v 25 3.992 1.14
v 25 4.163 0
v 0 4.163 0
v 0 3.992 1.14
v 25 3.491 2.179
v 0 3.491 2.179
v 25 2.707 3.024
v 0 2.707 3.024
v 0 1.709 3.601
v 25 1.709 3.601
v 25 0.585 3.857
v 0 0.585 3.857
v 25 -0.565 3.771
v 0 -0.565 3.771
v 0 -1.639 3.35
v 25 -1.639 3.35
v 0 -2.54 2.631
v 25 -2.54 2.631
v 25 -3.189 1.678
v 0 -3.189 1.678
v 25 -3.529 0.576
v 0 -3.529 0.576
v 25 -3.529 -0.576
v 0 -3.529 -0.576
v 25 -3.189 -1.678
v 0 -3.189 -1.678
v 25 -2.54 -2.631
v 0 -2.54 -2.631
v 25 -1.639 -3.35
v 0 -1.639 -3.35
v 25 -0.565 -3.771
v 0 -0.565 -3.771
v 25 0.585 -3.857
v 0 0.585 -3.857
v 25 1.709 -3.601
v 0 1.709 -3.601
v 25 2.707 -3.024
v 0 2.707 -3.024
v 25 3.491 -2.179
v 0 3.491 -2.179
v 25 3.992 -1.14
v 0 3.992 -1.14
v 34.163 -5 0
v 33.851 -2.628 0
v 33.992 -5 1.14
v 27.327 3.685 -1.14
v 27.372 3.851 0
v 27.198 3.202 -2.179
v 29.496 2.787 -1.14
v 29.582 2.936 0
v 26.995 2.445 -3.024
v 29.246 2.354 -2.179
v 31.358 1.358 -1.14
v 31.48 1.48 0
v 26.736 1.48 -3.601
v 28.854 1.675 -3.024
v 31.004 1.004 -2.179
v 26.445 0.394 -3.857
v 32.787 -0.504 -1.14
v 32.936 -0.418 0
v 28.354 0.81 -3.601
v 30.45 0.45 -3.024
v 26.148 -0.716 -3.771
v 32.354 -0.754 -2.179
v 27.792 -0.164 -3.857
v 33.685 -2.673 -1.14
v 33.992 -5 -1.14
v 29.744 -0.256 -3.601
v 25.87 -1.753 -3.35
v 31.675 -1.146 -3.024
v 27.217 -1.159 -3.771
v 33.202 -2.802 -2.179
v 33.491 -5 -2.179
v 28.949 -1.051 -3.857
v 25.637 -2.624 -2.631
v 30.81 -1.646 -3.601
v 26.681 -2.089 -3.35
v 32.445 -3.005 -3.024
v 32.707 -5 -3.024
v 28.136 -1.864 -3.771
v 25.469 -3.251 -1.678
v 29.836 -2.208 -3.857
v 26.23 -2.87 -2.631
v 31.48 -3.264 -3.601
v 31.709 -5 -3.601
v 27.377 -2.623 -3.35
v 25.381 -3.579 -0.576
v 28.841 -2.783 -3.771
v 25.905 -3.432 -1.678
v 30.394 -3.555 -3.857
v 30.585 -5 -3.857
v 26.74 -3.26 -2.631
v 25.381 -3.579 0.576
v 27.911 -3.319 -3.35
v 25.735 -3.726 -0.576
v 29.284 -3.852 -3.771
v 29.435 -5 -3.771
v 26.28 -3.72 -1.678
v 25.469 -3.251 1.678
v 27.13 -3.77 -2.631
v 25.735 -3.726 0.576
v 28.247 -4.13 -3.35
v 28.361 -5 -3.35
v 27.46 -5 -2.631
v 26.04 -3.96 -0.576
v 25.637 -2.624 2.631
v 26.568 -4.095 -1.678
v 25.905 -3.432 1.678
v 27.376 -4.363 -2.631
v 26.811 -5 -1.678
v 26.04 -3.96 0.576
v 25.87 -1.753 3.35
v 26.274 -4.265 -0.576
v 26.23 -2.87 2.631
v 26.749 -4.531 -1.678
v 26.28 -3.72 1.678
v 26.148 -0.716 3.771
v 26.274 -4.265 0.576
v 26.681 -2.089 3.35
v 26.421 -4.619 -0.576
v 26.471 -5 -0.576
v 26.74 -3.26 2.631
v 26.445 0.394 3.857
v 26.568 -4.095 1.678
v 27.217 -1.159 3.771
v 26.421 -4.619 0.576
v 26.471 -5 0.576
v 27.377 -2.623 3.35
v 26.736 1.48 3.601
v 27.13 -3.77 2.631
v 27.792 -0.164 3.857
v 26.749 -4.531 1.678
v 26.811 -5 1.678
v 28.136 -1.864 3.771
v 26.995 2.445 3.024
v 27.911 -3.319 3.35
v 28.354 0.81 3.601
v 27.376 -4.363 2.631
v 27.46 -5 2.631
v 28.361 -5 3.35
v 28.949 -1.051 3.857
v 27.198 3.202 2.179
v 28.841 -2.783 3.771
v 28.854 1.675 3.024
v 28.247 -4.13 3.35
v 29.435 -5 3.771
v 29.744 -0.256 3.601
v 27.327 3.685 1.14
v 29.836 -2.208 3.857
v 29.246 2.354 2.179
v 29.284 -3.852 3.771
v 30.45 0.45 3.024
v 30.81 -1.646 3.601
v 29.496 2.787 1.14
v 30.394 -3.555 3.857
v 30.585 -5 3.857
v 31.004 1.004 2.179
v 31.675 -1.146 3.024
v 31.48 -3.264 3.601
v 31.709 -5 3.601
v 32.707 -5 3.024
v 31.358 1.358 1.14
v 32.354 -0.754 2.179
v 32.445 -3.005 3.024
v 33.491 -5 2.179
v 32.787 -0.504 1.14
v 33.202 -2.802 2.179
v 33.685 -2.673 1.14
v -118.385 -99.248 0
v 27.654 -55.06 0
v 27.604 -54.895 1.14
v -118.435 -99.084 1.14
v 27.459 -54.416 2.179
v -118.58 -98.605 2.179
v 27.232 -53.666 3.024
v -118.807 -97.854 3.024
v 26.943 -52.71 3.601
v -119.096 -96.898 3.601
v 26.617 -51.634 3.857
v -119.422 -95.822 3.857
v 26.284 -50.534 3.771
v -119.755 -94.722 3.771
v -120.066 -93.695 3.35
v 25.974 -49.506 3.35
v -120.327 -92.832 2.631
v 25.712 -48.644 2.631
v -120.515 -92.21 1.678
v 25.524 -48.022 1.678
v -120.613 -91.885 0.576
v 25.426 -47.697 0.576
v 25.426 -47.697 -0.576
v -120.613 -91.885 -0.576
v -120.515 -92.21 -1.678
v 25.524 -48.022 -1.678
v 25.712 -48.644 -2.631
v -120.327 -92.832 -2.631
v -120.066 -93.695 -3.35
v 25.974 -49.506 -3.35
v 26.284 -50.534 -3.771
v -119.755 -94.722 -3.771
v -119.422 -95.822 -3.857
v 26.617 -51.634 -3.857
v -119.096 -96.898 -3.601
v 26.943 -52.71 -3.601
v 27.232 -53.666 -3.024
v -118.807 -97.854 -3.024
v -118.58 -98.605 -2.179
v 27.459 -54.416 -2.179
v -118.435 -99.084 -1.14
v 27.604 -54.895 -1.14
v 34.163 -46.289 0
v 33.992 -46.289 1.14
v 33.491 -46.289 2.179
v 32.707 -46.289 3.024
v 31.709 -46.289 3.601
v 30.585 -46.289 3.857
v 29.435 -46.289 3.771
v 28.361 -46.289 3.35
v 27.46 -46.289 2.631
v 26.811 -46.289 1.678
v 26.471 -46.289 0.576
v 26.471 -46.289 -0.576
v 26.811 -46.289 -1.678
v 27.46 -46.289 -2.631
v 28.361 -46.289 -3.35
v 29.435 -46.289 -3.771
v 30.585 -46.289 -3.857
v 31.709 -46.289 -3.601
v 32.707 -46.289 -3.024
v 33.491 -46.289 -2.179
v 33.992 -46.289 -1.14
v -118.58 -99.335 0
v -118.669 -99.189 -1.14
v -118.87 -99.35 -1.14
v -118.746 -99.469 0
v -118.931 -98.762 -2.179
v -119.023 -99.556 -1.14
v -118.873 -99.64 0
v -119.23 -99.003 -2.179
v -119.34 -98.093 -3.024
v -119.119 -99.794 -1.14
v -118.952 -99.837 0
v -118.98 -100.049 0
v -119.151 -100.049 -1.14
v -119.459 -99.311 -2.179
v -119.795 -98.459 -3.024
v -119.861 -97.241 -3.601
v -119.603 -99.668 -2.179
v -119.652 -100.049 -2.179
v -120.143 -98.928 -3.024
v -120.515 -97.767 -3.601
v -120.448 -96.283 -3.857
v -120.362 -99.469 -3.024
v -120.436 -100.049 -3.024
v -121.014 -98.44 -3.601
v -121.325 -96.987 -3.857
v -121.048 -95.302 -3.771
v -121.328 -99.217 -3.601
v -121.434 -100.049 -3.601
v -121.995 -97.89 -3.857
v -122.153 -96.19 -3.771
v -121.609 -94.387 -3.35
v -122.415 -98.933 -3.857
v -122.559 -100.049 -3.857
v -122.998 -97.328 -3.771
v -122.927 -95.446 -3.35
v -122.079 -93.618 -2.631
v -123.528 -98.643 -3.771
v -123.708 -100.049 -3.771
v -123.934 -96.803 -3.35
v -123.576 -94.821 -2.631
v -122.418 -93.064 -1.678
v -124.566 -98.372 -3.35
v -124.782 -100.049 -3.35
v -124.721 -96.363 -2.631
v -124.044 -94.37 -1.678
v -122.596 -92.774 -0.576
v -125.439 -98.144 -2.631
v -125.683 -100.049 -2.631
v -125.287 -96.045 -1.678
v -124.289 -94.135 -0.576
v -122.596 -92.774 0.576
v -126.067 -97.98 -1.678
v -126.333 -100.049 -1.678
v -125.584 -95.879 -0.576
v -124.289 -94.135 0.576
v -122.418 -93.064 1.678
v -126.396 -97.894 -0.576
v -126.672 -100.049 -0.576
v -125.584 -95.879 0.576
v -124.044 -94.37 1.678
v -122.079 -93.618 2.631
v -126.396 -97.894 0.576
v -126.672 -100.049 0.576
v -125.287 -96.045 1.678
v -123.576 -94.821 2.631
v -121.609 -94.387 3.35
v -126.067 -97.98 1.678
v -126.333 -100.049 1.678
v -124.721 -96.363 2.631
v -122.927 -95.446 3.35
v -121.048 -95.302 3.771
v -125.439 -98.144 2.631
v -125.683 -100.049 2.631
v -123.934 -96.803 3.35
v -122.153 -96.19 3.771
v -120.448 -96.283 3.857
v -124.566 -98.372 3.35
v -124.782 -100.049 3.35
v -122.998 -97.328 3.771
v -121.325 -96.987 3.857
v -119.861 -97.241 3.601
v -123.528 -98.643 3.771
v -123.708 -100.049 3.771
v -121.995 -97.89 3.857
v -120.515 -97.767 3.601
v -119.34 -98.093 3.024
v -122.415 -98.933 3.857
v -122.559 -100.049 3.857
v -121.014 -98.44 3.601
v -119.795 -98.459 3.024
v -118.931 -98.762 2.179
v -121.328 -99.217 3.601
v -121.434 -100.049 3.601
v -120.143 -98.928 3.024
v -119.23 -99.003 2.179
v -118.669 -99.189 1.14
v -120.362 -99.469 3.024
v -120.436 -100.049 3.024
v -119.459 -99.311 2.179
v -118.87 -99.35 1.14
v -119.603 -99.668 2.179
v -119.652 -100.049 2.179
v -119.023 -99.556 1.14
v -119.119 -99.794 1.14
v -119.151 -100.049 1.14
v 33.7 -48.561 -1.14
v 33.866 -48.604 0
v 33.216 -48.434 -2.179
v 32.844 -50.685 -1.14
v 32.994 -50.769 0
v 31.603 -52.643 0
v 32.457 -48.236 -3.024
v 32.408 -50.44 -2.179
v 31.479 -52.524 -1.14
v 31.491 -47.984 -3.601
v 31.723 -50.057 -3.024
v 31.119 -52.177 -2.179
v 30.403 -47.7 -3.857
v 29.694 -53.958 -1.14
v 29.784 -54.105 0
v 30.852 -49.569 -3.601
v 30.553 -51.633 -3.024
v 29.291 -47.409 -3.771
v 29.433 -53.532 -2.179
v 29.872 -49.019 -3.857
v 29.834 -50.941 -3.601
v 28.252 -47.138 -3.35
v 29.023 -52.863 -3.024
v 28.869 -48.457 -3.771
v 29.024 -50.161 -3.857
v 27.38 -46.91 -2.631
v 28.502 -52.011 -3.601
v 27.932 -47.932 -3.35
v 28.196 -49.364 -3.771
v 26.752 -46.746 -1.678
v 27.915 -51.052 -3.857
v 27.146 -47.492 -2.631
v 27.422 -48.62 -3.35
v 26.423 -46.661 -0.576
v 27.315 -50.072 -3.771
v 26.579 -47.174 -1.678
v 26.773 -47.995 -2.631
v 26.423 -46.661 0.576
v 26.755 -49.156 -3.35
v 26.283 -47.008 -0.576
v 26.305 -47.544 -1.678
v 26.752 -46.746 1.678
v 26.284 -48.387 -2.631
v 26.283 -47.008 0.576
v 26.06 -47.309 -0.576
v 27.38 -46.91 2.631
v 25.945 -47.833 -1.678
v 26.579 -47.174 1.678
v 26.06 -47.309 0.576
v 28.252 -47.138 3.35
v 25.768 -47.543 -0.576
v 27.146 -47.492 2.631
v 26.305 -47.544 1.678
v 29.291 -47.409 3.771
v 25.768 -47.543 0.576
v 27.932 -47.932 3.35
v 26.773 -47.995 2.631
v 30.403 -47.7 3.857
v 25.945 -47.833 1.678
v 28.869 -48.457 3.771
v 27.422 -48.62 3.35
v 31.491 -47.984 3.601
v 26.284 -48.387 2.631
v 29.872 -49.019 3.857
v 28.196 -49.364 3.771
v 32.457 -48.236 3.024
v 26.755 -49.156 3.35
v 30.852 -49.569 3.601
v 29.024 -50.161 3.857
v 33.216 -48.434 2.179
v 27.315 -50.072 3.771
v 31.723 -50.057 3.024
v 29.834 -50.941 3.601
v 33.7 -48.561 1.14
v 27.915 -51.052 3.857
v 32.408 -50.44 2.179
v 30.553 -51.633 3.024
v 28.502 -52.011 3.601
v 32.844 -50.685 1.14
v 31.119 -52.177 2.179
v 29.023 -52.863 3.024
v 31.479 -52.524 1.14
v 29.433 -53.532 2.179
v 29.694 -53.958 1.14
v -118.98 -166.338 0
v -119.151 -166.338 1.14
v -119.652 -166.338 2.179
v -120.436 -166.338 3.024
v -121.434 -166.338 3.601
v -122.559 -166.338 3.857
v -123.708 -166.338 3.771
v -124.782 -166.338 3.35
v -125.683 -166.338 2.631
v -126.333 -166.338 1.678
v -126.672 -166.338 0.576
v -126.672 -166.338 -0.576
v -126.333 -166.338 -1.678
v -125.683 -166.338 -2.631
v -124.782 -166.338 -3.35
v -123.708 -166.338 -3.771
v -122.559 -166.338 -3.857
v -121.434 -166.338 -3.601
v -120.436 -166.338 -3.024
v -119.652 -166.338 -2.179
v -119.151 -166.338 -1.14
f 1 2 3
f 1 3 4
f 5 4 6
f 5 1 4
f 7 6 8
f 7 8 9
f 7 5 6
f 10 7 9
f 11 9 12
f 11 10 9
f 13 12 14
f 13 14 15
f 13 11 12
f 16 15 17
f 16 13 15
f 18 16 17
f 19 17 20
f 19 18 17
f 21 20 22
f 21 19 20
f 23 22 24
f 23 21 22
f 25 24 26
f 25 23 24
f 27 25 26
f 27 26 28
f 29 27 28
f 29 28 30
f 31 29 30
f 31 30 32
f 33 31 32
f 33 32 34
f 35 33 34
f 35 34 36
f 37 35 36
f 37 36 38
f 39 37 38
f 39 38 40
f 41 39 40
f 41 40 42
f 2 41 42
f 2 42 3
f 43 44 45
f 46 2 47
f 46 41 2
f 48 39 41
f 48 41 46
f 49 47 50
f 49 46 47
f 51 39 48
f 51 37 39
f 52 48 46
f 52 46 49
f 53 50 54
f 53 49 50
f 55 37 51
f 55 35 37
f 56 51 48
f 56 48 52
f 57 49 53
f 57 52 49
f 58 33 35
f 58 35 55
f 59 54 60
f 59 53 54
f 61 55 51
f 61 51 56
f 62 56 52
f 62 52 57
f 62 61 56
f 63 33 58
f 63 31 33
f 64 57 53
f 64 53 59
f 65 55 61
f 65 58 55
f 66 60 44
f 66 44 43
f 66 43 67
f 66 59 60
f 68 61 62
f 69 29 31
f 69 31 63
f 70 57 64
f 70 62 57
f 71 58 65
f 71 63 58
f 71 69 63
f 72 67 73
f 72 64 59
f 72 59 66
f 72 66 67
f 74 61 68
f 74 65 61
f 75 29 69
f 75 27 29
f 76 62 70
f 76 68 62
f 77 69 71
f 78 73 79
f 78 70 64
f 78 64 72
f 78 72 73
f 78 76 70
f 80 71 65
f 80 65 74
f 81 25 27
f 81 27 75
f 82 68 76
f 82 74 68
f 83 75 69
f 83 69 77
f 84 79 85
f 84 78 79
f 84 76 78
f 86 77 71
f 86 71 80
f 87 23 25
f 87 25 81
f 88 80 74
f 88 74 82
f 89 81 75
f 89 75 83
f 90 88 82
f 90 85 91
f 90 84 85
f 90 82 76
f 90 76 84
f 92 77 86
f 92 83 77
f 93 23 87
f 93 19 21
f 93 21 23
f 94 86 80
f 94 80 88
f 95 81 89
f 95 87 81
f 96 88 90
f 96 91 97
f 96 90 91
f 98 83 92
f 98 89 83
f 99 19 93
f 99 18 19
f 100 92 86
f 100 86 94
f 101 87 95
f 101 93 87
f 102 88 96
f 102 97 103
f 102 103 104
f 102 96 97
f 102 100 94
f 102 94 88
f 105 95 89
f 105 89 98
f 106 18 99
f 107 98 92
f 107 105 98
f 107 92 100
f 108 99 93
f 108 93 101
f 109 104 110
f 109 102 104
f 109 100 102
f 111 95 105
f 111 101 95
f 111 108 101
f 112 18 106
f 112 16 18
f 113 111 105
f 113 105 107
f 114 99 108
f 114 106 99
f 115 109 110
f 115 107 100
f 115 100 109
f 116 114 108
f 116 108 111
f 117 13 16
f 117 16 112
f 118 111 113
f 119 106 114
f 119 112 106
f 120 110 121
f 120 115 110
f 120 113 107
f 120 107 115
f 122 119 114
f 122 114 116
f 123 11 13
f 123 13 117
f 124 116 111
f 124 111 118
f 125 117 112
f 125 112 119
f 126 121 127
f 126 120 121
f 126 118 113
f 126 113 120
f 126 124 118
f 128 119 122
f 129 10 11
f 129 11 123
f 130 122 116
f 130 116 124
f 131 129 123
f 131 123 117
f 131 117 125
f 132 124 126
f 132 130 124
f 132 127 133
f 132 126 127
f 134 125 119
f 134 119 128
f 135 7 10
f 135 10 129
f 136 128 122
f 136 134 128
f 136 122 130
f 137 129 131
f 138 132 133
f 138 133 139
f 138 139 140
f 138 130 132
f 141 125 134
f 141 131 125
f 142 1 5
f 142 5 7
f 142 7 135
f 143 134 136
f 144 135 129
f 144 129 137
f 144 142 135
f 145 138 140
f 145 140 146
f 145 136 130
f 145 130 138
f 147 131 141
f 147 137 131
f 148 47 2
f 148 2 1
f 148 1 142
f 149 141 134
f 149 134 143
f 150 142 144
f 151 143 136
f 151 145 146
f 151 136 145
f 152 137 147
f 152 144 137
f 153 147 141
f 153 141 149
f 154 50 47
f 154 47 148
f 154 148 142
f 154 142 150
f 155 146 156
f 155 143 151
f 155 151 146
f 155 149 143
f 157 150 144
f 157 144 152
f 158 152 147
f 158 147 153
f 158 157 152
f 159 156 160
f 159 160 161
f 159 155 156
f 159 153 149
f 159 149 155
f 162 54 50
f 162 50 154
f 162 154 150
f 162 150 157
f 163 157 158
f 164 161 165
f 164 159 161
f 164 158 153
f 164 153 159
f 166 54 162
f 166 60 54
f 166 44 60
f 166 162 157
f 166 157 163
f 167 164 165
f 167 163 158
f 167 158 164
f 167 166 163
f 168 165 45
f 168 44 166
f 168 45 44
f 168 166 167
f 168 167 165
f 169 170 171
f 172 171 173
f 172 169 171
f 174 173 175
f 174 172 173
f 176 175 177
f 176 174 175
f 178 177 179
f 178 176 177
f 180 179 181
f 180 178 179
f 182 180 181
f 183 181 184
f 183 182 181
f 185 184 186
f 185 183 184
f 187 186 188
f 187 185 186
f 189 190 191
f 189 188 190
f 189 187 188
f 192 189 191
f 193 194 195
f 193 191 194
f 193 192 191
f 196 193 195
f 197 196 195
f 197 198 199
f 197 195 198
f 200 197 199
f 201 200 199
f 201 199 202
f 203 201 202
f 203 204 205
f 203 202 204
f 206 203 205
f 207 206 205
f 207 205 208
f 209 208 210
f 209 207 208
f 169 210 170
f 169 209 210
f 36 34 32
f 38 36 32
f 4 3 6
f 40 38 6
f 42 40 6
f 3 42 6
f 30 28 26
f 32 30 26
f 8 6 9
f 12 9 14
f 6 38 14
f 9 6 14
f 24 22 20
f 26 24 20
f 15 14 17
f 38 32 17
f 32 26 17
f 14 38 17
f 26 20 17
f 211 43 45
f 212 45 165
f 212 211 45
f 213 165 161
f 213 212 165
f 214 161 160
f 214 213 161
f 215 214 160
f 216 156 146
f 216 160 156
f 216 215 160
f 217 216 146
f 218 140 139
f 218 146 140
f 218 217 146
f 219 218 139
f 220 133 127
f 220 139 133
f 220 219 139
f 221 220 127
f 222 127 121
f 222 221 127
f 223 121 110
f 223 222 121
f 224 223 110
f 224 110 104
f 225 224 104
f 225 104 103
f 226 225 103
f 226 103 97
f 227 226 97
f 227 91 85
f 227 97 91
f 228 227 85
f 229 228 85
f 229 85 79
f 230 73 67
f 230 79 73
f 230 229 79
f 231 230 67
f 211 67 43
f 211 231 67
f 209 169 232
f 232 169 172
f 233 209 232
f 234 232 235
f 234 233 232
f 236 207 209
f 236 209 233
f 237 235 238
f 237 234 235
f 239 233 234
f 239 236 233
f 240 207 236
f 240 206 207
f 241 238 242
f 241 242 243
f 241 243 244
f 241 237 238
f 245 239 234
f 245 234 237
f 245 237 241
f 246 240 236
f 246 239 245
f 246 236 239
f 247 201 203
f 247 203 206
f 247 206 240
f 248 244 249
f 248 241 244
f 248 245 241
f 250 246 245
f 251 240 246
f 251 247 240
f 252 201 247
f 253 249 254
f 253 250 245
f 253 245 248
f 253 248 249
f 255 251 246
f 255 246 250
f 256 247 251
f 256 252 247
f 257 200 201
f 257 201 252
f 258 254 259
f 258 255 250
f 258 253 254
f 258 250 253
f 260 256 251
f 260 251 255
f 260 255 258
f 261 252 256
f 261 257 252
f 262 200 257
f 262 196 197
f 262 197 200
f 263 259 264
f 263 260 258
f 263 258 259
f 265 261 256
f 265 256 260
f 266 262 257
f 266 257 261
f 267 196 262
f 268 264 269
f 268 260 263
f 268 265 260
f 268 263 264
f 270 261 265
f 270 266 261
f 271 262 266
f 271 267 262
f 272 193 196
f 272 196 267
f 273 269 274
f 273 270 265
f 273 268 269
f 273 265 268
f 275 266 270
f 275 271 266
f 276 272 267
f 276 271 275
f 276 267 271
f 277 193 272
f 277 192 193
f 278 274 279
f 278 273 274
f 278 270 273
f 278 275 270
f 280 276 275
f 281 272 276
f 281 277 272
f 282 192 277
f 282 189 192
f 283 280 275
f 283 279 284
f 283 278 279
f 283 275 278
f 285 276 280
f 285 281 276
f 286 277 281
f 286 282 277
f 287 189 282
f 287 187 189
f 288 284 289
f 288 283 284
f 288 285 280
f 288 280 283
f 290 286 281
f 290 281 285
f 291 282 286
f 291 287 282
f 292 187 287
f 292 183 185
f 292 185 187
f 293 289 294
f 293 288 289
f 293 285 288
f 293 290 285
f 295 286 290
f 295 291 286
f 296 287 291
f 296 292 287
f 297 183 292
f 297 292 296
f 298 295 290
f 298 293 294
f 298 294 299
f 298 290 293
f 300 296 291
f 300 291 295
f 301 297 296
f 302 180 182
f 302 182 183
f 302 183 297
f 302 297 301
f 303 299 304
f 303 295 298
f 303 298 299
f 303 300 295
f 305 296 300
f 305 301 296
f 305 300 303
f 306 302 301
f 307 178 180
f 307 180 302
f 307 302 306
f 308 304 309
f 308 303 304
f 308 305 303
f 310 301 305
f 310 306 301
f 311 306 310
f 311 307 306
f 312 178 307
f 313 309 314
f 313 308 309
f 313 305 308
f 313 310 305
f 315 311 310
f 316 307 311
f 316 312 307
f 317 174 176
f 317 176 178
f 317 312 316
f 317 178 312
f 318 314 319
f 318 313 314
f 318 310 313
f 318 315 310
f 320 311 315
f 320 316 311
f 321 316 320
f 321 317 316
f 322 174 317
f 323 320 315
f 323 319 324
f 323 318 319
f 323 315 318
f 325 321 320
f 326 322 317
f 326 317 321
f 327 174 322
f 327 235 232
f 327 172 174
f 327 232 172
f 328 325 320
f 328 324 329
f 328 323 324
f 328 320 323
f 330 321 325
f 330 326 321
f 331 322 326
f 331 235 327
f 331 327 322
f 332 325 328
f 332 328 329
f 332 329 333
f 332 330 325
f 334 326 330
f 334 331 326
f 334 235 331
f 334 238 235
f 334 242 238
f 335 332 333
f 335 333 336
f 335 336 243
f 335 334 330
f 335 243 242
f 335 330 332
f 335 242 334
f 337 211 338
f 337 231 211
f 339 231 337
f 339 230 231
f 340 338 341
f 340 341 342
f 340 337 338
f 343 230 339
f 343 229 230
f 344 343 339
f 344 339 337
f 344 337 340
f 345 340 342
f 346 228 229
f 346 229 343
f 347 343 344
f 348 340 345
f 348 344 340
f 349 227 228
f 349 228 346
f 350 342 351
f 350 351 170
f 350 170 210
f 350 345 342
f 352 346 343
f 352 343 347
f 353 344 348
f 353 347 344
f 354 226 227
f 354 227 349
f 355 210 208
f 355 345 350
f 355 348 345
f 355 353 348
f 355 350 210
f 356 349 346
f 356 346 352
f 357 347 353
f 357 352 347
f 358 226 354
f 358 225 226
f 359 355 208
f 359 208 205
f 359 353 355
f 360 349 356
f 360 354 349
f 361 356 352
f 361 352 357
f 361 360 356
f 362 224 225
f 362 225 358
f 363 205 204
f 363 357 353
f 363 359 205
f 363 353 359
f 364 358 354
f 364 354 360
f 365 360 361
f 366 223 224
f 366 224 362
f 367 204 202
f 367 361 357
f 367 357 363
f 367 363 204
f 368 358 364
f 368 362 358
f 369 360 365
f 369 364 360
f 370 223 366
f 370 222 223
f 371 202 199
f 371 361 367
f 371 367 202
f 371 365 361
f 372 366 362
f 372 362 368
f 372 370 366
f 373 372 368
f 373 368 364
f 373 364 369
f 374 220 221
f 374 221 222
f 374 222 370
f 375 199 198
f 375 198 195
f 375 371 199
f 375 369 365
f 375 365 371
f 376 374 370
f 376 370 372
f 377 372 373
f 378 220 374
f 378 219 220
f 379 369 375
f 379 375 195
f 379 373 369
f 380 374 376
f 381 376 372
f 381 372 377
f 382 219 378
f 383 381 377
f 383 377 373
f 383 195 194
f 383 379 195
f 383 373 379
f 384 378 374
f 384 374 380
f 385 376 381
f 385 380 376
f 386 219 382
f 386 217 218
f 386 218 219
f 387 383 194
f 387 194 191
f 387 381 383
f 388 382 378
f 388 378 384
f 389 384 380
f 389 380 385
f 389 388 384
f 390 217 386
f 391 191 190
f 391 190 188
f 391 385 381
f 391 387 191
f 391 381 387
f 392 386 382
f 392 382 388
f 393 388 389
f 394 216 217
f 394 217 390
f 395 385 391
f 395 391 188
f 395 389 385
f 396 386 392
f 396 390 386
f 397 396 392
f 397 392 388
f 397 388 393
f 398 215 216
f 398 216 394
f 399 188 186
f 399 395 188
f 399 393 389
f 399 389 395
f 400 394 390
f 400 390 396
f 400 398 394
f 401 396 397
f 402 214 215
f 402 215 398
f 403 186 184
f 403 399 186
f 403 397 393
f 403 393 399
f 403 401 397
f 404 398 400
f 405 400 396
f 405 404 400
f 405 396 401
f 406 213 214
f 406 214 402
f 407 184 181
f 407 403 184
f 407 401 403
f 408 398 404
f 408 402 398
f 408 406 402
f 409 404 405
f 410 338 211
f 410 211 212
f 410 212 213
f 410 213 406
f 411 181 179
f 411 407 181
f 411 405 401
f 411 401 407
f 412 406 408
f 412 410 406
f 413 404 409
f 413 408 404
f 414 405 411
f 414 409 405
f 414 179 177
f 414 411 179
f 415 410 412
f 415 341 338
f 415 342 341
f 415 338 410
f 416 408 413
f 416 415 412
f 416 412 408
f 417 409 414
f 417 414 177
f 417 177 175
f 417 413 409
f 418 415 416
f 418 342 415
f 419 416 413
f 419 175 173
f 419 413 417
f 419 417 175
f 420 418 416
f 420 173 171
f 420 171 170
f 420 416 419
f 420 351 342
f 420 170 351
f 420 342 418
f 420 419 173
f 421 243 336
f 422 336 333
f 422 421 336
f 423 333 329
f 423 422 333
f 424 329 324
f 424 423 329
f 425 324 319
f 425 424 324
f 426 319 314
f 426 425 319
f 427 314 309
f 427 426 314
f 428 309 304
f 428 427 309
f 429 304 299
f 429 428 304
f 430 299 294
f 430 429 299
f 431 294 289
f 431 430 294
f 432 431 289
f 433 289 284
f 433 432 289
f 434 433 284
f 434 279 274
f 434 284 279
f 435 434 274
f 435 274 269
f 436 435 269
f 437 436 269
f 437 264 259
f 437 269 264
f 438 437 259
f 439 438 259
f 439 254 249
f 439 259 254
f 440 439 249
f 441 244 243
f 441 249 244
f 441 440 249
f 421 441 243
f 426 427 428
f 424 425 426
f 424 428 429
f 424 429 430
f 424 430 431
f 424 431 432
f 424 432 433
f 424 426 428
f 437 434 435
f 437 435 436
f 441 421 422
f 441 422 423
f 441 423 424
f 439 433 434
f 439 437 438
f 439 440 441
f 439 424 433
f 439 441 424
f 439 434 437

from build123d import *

# Parameters (mm, degrees)
F2_R = 3.868


with BuildPart() as f3:
    # F3: sweep along a path in F0
    with BuildLine(Plane.XY) as f3_path:
        Line((0, 0), (25, 0))
        ThreePointArc((25, 0), (28.5355339059, -1.4644660941), (30, -5))
        Line((30, -5), (30, -46.2890183416))
        ThreePointArc((30, -46.2890183416), (29.0149889262, -49.2689283944), (26.448054431, -51.0747406868))
        Line((26.448054431, -51.0747406868), (-119.5911694754, -95.2630011068))
        ThreePointArc((-119.5911694754, -95.2630011068), (-122.1581039705, -97.0688133992), (-123.1431150443, -100.0487234519))
        Line((-123.1431150443, -100.0487234519), (-123.1431150443, -166.3377417936))
    # F2 (on line) → F3 (sweep)
    with BuildSketch(Plane.XZ.offset(166.3377417936)):
        with Locations((-122.8476336243, 0)):
            Circle(F2_R)
    sweep(path=f3_path.line)


solid = f3.part
